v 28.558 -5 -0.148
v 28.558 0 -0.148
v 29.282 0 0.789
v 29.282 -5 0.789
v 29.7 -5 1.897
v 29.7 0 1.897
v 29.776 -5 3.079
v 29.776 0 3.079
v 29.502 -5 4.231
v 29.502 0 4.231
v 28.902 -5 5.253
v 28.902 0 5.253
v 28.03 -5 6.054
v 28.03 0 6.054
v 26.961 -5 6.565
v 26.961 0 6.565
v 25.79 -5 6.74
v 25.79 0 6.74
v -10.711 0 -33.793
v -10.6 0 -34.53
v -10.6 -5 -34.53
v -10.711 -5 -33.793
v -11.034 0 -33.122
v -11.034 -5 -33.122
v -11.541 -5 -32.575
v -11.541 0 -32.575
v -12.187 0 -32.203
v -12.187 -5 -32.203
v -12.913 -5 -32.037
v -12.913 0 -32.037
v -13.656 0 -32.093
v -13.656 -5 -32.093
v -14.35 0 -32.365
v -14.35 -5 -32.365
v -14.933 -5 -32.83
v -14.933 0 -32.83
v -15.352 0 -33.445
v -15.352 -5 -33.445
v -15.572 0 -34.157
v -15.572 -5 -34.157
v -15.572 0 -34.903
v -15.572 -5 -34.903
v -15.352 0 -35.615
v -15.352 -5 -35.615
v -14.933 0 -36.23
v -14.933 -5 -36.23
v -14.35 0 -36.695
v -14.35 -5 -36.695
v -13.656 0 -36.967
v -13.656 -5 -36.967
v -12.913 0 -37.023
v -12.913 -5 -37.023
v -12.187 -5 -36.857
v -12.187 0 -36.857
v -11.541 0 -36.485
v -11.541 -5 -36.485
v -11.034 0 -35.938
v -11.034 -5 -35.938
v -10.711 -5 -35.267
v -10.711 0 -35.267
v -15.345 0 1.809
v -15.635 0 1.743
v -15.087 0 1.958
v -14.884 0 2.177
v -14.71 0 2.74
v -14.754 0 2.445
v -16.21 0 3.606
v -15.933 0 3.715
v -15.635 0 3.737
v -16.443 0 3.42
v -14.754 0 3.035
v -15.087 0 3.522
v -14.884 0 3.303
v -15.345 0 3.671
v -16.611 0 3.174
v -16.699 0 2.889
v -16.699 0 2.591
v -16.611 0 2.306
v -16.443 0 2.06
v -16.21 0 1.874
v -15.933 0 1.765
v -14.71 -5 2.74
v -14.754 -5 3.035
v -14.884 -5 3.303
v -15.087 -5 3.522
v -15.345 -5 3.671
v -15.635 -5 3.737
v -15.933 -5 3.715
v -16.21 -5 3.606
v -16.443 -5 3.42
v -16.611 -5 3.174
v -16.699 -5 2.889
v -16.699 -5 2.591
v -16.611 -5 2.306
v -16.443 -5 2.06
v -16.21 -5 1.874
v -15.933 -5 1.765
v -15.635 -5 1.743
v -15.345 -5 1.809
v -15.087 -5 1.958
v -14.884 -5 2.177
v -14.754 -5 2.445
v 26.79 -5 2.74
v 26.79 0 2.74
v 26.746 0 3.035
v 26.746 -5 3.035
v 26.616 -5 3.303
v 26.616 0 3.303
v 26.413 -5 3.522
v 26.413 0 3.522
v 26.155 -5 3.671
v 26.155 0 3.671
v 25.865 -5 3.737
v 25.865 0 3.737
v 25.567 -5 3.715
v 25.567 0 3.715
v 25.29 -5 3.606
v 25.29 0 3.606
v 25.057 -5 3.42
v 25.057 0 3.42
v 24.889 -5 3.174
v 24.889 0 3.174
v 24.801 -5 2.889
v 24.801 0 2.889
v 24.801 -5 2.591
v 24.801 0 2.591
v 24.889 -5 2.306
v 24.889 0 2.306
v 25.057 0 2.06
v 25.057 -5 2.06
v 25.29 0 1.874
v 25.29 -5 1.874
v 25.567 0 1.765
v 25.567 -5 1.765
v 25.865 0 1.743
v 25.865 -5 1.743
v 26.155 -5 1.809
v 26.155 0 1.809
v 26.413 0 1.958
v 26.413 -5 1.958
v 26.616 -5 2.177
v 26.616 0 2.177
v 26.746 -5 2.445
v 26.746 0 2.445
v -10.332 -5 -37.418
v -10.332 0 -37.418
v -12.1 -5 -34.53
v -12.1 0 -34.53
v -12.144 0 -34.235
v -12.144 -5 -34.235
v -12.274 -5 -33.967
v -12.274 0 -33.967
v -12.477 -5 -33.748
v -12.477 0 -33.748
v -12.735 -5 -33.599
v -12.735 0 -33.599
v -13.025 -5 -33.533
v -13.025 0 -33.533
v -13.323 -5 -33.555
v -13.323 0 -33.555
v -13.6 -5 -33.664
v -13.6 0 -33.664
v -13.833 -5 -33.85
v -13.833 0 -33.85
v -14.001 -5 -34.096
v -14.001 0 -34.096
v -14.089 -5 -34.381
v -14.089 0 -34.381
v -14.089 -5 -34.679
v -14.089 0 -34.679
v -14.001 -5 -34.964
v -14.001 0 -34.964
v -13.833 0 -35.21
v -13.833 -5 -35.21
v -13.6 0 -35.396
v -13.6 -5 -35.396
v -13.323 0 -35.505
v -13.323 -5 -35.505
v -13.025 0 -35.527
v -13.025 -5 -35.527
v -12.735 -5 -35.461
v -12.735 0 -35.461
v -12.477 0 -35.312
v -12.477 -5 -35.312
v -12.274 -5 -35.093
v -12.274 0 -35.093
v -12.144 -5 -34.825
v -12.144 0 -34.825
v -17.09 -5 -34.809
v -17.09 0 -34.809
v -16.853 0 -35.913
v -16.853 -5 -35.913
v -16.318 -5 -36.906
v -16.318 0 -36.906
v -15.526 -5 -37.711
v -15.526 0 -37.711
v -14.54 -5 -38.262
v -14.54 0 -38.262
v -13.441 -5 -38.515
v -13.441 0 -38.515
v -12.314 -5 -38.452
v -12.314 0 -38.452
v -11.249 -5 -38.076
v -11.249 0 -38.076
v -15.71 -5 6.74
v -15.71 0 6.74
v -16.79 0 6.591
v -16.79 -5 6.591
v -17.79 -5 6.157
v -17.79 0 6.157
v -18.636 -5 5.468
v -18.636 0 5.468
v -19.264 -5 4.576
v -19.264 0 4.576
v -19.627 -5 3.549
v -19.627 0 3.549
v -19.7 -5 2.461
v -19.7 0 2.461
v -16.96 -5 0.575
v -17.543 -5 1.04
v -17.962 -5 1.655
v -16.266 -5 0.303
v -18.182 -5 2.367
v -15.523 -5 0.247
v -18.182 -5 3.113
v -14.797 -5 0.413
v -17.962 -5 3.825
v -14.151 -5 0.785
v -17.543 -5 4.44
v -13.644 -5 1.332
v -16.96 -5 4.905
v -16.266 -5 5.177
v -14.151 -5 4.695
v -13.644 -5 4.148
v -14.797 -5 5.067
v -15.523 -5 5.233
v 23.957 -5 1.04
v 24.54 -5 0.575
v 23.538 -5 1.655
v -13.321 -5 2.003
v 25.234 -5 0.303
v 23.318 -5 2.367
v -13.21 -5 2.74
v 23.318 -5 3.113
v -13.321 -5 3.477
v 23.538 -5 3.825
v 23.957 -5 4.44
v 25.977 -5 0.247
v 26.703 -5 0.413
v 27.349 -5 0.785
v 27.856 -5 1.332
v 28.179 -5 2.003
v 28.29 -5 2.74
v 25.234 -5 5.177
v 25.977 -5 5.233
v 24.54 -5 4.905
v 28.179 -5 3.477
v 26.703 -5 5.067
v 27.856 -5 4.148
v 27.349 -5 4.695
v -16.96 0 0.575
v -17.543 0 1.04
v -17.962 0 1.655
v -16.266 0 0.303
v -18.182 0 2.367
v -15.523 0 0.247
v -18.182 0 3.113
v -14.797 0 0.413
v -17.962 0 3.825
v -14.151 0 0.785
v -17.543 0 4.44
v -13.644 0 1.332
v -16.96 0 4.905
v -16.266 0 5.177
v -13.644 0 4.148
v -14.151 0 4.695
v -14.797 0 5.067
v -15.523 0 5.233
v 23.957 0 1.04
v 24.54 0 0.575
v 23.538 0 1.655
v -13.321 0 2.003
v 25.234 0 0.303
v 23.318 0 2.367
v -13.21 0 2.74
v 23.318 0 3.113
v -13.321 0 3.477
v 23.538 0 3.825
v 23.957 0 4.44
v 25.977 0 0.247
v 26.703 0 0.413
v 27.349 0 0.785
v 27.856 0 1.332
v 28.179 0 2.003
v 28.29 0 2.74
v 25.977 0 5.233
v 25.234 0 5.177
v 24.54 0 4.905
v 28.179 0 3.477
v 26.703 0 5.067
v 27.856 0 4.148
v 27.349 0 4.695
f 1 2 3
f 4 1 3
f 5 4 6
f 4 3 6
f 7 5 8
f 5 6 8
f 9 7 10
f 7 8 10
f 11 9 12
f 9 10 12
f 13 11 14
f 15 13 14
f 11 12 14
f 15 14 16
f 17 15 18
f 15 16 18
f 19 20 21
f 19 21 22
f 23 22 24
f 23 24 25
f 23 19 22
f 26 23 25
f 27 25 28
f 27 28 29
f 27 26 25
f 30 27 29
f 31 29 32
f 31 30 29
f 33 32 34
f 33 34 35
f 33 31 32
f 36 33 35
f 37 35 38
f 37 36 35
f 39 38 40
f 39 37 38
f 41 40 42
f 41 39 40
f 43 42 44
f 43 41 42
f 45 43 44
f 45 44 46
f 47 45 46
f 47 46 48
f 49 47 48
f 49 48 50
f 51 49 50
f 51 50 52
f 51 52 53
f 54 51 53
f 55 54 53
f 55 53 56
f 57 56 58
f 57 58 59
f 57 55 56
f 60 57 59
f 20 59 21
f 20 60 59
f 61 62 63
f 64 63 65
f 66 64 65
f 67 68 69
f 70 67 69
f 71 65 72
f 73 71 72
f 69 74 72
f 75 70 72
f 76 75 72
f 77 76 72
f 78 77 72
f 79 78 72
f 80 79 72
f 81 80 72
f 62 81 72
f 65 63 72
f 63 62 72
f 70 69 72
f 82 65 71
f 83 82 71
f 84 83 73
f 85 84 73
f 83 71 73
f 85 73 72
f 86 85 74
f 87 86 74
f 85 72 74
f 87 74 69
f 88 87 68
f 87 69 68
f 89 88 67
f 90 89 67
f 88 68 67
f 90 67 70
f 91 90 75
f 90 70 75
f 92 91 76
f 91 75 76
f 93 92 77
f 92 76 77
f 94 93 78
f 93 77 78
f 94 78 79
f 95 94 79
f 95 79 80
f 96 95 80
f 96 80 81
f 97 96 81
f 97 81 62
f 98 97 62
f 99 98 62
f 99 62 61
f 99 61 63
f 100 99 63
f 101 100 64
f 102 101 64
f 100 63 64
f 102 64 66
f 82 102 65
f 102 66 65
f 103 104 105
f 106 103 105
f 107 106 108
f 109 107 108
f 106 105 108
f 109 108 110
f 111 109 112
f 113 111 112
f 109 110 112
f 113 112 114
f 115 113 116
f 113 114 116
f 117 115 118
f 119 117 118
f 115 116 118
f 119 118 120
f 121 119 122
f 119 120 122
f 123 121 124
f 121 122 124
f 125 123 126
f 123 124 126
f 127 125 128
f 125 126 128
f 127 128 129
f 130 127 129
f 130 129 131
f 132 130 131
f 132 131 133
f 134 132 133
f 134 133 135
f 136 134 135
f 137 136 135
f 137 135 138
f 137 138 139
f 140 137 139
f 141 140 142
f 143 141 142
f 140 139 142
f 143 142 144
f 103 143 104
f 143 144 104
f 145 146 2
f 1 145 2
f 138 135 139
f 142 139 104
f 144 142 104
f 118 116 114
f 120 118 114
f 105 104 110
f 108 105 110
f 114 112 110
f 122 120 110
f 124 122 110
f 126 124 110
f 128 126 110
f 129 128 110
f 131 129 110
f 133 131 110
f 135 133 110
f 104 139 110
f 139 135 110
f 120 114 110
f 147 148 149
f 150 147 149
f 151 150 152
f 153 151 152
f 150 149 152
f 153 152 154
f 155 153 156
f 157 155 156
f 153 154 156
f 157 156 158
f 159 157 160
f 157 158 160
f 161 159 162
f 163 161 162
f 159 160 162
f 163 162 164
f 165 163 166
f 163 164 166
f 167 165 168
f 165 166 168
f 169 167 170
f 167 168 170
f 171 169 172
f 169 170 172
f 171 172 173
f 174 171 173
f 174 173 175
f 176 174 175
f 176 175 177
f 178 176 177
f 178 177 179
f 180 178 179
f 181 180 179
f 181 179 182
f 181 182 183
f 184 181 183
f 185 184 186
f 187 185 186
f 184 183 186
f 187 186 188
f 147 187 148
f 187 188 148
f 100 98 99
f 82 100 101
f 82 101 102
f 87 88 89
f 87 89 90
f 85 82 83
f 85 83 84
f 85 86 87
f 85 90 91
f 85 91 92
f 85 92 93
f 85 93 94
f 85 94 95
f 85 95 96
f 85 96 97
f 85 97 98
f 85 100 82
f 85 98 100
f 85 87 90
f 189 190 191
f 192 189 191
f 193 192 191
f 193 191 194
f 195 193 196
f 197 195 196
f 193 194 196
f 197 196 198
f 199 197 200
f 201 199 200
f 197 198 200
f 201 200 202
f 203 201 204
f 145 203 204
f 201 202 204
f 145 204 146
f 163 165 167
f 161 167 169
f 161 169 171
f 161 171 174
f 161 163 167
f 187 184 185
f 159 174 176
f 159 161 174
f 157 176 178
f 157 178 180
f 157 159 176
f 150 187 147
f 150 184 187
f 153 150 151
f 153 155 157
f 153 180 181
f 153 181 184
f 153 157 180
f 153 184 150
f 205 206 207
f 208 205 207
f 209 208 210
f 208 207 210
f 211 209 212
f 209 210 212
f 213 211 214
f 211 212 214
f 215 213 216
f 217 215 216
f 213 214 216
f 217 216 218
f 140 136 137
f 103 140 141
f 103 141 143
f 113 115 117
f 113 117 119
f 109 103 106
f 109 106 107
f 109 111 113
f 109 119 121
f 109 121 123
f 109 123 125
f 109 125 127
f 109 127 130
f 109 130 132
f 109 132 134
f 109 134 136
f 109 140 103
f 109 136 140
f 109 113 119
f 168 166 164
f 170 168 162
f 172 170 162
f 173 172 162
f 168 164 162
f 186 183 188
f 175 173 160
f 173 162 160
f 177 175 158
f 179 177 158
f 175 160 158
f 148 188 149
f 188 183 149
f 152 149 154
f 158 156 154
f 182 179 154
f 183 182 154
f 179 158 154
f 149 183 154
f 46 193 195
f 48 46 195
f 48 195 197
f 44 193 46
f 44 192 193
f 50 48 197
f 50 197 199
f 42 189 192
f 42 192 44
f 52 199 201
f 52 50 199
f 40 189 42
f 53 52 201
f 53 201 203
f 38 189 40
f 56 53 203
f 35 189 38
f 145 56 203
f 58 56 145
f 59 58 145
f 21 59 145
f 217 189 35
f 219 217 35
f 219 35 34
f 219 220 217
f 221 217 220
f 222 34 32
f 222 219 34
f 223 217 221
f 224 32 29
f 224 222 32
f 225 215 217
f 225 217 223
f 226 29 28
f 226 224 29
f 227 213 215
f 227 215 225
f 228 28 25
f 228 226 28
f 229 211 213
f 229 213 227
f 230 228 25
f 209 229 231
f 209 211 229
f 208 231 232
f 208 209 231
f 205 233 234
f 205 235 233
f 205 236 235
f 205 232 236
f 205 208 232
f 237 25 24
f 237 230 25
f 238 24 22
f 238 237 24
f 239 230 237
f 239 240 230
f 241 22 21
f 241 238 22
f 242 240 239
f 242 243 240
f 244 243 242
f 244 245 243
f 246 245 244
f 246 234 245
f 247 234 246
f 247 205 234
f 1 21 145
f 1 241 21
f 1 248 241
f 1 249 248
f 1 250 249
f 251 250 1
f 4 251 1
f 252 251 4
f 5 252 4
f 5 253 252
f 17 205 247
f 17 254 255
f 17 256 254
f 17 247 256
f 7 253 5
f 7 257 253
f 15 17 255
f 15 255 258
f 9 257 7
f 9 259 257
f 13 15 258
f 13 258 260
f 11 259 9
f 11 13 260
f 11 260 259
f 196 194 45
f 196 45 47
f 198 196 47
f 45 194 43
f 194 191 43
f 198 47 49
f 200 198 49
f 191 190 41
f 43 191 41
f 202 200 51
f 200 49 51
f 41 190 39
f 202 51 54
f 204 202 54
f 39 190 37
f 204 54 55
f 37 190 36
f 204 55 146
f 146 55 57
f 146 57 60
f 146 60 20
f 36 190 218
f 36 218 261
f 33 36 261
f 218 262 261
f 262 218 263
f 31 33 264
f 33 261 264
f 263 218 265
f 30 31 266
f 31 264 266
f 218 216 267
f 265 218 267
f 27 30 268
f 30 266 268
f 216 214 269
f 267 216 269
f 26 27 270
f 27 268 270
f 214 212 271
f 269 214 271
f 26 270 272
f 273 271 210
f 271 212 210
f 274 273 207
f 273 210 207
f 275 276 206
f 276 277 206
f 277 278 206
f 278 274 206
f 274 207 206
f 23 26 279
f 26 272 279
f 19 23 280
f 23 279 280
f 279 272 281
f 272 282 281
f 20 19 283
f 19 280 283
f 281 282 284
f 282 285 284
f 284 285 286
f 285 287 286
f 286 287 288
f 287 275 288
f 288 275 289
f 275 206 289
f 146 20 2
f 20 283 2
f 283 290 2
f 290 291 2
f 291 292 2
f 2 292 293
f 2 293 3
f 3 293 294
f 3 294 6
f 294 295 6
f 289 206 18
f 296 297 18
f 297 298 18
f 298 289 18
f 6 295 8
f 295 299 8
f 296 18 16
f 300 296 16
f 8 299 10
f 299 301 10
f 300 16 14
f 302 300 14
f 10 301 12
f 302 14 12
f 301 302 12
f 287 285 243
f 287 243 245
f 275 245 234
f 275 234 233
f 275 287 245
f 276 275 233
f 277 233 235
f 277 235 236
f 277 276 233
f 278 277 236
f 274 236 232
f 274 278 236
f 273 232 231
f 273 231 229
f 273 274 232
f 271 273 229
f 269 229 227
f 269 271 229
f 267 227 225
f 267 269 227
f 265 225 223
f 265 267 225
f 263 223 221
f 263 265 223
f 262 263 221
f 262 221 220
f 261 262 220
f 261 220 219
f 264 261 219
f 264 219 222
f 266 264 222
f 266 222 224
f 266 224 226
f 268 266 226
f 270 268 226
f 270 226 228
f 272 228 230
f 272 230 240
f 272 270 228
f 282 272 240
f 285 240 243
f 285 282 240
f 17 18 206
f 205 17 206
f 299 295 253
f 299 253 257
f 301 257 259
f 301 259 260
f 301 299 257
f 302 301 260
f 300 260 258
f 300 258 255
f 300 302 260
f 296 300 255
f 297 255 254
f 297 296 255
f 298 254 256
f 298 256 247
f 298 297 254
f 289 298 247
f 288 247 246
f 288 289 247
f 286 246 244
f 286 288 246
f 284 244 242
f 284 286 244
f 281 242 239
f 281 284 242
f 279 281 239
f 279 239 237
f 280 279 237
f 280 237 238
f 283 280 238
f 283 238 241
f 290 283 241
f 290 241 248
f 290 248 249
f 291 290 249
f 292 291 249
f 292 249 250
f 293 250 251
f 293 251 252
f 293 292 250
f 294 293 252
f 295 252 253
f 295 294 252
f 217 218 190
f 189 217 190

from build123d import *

# Parameters (mm, degrees)
F0_R     = 2.5
F0_R_2   = 1
F1_DEPTH = 5


with BuildPart() as f1:
    # F0 (on Front) → F1 (new body)
    with BuildSketch(Plane.XZ):
        with BuildLine():
            Line((25.79, 6.74), (-15.71, 6.74))
            ThreePointArc((-15.71, 6.74), (-18.635554, 5.467844), (-19.700228, 2.460566))
            Line((-19.700228, 2.460566), (-17.090228, -34.809434))
            ThreePointArc((-17.090228, -34.809434), (-14.540401, -38.261655), (-10.332362, -37.417937))
            Line((-10.332362, -37.417937), (28.557638, -0.147937))
            ThreePointArc((28.557638, -0.147937), (29.501587, 4.23135), (25.79, 6.74))
        make_face()
        with Locations((-13.1, -34.53)):
            Circle(F0_R, mode=Mode.SUBTRACT)
        with Locations((-15.71, 2.74)):
            Circle(F0_R, mode=Mode.SUBTRACT)
        with Locations((25.79, 2.74)):
            Circle(F0_R, mode=Mode.SUBTRACT)
        with Locations((-15.71, 2.74)):
            Circle(F0_R_2)
        with Locations((25.79, 2.74)):
            Circle(F0_R_2)
        with Locations((-13.1, -34.53)):
            Circle(F0_R_2)
    extrude(amount=F1_DEPTH)


solid = f1.part
